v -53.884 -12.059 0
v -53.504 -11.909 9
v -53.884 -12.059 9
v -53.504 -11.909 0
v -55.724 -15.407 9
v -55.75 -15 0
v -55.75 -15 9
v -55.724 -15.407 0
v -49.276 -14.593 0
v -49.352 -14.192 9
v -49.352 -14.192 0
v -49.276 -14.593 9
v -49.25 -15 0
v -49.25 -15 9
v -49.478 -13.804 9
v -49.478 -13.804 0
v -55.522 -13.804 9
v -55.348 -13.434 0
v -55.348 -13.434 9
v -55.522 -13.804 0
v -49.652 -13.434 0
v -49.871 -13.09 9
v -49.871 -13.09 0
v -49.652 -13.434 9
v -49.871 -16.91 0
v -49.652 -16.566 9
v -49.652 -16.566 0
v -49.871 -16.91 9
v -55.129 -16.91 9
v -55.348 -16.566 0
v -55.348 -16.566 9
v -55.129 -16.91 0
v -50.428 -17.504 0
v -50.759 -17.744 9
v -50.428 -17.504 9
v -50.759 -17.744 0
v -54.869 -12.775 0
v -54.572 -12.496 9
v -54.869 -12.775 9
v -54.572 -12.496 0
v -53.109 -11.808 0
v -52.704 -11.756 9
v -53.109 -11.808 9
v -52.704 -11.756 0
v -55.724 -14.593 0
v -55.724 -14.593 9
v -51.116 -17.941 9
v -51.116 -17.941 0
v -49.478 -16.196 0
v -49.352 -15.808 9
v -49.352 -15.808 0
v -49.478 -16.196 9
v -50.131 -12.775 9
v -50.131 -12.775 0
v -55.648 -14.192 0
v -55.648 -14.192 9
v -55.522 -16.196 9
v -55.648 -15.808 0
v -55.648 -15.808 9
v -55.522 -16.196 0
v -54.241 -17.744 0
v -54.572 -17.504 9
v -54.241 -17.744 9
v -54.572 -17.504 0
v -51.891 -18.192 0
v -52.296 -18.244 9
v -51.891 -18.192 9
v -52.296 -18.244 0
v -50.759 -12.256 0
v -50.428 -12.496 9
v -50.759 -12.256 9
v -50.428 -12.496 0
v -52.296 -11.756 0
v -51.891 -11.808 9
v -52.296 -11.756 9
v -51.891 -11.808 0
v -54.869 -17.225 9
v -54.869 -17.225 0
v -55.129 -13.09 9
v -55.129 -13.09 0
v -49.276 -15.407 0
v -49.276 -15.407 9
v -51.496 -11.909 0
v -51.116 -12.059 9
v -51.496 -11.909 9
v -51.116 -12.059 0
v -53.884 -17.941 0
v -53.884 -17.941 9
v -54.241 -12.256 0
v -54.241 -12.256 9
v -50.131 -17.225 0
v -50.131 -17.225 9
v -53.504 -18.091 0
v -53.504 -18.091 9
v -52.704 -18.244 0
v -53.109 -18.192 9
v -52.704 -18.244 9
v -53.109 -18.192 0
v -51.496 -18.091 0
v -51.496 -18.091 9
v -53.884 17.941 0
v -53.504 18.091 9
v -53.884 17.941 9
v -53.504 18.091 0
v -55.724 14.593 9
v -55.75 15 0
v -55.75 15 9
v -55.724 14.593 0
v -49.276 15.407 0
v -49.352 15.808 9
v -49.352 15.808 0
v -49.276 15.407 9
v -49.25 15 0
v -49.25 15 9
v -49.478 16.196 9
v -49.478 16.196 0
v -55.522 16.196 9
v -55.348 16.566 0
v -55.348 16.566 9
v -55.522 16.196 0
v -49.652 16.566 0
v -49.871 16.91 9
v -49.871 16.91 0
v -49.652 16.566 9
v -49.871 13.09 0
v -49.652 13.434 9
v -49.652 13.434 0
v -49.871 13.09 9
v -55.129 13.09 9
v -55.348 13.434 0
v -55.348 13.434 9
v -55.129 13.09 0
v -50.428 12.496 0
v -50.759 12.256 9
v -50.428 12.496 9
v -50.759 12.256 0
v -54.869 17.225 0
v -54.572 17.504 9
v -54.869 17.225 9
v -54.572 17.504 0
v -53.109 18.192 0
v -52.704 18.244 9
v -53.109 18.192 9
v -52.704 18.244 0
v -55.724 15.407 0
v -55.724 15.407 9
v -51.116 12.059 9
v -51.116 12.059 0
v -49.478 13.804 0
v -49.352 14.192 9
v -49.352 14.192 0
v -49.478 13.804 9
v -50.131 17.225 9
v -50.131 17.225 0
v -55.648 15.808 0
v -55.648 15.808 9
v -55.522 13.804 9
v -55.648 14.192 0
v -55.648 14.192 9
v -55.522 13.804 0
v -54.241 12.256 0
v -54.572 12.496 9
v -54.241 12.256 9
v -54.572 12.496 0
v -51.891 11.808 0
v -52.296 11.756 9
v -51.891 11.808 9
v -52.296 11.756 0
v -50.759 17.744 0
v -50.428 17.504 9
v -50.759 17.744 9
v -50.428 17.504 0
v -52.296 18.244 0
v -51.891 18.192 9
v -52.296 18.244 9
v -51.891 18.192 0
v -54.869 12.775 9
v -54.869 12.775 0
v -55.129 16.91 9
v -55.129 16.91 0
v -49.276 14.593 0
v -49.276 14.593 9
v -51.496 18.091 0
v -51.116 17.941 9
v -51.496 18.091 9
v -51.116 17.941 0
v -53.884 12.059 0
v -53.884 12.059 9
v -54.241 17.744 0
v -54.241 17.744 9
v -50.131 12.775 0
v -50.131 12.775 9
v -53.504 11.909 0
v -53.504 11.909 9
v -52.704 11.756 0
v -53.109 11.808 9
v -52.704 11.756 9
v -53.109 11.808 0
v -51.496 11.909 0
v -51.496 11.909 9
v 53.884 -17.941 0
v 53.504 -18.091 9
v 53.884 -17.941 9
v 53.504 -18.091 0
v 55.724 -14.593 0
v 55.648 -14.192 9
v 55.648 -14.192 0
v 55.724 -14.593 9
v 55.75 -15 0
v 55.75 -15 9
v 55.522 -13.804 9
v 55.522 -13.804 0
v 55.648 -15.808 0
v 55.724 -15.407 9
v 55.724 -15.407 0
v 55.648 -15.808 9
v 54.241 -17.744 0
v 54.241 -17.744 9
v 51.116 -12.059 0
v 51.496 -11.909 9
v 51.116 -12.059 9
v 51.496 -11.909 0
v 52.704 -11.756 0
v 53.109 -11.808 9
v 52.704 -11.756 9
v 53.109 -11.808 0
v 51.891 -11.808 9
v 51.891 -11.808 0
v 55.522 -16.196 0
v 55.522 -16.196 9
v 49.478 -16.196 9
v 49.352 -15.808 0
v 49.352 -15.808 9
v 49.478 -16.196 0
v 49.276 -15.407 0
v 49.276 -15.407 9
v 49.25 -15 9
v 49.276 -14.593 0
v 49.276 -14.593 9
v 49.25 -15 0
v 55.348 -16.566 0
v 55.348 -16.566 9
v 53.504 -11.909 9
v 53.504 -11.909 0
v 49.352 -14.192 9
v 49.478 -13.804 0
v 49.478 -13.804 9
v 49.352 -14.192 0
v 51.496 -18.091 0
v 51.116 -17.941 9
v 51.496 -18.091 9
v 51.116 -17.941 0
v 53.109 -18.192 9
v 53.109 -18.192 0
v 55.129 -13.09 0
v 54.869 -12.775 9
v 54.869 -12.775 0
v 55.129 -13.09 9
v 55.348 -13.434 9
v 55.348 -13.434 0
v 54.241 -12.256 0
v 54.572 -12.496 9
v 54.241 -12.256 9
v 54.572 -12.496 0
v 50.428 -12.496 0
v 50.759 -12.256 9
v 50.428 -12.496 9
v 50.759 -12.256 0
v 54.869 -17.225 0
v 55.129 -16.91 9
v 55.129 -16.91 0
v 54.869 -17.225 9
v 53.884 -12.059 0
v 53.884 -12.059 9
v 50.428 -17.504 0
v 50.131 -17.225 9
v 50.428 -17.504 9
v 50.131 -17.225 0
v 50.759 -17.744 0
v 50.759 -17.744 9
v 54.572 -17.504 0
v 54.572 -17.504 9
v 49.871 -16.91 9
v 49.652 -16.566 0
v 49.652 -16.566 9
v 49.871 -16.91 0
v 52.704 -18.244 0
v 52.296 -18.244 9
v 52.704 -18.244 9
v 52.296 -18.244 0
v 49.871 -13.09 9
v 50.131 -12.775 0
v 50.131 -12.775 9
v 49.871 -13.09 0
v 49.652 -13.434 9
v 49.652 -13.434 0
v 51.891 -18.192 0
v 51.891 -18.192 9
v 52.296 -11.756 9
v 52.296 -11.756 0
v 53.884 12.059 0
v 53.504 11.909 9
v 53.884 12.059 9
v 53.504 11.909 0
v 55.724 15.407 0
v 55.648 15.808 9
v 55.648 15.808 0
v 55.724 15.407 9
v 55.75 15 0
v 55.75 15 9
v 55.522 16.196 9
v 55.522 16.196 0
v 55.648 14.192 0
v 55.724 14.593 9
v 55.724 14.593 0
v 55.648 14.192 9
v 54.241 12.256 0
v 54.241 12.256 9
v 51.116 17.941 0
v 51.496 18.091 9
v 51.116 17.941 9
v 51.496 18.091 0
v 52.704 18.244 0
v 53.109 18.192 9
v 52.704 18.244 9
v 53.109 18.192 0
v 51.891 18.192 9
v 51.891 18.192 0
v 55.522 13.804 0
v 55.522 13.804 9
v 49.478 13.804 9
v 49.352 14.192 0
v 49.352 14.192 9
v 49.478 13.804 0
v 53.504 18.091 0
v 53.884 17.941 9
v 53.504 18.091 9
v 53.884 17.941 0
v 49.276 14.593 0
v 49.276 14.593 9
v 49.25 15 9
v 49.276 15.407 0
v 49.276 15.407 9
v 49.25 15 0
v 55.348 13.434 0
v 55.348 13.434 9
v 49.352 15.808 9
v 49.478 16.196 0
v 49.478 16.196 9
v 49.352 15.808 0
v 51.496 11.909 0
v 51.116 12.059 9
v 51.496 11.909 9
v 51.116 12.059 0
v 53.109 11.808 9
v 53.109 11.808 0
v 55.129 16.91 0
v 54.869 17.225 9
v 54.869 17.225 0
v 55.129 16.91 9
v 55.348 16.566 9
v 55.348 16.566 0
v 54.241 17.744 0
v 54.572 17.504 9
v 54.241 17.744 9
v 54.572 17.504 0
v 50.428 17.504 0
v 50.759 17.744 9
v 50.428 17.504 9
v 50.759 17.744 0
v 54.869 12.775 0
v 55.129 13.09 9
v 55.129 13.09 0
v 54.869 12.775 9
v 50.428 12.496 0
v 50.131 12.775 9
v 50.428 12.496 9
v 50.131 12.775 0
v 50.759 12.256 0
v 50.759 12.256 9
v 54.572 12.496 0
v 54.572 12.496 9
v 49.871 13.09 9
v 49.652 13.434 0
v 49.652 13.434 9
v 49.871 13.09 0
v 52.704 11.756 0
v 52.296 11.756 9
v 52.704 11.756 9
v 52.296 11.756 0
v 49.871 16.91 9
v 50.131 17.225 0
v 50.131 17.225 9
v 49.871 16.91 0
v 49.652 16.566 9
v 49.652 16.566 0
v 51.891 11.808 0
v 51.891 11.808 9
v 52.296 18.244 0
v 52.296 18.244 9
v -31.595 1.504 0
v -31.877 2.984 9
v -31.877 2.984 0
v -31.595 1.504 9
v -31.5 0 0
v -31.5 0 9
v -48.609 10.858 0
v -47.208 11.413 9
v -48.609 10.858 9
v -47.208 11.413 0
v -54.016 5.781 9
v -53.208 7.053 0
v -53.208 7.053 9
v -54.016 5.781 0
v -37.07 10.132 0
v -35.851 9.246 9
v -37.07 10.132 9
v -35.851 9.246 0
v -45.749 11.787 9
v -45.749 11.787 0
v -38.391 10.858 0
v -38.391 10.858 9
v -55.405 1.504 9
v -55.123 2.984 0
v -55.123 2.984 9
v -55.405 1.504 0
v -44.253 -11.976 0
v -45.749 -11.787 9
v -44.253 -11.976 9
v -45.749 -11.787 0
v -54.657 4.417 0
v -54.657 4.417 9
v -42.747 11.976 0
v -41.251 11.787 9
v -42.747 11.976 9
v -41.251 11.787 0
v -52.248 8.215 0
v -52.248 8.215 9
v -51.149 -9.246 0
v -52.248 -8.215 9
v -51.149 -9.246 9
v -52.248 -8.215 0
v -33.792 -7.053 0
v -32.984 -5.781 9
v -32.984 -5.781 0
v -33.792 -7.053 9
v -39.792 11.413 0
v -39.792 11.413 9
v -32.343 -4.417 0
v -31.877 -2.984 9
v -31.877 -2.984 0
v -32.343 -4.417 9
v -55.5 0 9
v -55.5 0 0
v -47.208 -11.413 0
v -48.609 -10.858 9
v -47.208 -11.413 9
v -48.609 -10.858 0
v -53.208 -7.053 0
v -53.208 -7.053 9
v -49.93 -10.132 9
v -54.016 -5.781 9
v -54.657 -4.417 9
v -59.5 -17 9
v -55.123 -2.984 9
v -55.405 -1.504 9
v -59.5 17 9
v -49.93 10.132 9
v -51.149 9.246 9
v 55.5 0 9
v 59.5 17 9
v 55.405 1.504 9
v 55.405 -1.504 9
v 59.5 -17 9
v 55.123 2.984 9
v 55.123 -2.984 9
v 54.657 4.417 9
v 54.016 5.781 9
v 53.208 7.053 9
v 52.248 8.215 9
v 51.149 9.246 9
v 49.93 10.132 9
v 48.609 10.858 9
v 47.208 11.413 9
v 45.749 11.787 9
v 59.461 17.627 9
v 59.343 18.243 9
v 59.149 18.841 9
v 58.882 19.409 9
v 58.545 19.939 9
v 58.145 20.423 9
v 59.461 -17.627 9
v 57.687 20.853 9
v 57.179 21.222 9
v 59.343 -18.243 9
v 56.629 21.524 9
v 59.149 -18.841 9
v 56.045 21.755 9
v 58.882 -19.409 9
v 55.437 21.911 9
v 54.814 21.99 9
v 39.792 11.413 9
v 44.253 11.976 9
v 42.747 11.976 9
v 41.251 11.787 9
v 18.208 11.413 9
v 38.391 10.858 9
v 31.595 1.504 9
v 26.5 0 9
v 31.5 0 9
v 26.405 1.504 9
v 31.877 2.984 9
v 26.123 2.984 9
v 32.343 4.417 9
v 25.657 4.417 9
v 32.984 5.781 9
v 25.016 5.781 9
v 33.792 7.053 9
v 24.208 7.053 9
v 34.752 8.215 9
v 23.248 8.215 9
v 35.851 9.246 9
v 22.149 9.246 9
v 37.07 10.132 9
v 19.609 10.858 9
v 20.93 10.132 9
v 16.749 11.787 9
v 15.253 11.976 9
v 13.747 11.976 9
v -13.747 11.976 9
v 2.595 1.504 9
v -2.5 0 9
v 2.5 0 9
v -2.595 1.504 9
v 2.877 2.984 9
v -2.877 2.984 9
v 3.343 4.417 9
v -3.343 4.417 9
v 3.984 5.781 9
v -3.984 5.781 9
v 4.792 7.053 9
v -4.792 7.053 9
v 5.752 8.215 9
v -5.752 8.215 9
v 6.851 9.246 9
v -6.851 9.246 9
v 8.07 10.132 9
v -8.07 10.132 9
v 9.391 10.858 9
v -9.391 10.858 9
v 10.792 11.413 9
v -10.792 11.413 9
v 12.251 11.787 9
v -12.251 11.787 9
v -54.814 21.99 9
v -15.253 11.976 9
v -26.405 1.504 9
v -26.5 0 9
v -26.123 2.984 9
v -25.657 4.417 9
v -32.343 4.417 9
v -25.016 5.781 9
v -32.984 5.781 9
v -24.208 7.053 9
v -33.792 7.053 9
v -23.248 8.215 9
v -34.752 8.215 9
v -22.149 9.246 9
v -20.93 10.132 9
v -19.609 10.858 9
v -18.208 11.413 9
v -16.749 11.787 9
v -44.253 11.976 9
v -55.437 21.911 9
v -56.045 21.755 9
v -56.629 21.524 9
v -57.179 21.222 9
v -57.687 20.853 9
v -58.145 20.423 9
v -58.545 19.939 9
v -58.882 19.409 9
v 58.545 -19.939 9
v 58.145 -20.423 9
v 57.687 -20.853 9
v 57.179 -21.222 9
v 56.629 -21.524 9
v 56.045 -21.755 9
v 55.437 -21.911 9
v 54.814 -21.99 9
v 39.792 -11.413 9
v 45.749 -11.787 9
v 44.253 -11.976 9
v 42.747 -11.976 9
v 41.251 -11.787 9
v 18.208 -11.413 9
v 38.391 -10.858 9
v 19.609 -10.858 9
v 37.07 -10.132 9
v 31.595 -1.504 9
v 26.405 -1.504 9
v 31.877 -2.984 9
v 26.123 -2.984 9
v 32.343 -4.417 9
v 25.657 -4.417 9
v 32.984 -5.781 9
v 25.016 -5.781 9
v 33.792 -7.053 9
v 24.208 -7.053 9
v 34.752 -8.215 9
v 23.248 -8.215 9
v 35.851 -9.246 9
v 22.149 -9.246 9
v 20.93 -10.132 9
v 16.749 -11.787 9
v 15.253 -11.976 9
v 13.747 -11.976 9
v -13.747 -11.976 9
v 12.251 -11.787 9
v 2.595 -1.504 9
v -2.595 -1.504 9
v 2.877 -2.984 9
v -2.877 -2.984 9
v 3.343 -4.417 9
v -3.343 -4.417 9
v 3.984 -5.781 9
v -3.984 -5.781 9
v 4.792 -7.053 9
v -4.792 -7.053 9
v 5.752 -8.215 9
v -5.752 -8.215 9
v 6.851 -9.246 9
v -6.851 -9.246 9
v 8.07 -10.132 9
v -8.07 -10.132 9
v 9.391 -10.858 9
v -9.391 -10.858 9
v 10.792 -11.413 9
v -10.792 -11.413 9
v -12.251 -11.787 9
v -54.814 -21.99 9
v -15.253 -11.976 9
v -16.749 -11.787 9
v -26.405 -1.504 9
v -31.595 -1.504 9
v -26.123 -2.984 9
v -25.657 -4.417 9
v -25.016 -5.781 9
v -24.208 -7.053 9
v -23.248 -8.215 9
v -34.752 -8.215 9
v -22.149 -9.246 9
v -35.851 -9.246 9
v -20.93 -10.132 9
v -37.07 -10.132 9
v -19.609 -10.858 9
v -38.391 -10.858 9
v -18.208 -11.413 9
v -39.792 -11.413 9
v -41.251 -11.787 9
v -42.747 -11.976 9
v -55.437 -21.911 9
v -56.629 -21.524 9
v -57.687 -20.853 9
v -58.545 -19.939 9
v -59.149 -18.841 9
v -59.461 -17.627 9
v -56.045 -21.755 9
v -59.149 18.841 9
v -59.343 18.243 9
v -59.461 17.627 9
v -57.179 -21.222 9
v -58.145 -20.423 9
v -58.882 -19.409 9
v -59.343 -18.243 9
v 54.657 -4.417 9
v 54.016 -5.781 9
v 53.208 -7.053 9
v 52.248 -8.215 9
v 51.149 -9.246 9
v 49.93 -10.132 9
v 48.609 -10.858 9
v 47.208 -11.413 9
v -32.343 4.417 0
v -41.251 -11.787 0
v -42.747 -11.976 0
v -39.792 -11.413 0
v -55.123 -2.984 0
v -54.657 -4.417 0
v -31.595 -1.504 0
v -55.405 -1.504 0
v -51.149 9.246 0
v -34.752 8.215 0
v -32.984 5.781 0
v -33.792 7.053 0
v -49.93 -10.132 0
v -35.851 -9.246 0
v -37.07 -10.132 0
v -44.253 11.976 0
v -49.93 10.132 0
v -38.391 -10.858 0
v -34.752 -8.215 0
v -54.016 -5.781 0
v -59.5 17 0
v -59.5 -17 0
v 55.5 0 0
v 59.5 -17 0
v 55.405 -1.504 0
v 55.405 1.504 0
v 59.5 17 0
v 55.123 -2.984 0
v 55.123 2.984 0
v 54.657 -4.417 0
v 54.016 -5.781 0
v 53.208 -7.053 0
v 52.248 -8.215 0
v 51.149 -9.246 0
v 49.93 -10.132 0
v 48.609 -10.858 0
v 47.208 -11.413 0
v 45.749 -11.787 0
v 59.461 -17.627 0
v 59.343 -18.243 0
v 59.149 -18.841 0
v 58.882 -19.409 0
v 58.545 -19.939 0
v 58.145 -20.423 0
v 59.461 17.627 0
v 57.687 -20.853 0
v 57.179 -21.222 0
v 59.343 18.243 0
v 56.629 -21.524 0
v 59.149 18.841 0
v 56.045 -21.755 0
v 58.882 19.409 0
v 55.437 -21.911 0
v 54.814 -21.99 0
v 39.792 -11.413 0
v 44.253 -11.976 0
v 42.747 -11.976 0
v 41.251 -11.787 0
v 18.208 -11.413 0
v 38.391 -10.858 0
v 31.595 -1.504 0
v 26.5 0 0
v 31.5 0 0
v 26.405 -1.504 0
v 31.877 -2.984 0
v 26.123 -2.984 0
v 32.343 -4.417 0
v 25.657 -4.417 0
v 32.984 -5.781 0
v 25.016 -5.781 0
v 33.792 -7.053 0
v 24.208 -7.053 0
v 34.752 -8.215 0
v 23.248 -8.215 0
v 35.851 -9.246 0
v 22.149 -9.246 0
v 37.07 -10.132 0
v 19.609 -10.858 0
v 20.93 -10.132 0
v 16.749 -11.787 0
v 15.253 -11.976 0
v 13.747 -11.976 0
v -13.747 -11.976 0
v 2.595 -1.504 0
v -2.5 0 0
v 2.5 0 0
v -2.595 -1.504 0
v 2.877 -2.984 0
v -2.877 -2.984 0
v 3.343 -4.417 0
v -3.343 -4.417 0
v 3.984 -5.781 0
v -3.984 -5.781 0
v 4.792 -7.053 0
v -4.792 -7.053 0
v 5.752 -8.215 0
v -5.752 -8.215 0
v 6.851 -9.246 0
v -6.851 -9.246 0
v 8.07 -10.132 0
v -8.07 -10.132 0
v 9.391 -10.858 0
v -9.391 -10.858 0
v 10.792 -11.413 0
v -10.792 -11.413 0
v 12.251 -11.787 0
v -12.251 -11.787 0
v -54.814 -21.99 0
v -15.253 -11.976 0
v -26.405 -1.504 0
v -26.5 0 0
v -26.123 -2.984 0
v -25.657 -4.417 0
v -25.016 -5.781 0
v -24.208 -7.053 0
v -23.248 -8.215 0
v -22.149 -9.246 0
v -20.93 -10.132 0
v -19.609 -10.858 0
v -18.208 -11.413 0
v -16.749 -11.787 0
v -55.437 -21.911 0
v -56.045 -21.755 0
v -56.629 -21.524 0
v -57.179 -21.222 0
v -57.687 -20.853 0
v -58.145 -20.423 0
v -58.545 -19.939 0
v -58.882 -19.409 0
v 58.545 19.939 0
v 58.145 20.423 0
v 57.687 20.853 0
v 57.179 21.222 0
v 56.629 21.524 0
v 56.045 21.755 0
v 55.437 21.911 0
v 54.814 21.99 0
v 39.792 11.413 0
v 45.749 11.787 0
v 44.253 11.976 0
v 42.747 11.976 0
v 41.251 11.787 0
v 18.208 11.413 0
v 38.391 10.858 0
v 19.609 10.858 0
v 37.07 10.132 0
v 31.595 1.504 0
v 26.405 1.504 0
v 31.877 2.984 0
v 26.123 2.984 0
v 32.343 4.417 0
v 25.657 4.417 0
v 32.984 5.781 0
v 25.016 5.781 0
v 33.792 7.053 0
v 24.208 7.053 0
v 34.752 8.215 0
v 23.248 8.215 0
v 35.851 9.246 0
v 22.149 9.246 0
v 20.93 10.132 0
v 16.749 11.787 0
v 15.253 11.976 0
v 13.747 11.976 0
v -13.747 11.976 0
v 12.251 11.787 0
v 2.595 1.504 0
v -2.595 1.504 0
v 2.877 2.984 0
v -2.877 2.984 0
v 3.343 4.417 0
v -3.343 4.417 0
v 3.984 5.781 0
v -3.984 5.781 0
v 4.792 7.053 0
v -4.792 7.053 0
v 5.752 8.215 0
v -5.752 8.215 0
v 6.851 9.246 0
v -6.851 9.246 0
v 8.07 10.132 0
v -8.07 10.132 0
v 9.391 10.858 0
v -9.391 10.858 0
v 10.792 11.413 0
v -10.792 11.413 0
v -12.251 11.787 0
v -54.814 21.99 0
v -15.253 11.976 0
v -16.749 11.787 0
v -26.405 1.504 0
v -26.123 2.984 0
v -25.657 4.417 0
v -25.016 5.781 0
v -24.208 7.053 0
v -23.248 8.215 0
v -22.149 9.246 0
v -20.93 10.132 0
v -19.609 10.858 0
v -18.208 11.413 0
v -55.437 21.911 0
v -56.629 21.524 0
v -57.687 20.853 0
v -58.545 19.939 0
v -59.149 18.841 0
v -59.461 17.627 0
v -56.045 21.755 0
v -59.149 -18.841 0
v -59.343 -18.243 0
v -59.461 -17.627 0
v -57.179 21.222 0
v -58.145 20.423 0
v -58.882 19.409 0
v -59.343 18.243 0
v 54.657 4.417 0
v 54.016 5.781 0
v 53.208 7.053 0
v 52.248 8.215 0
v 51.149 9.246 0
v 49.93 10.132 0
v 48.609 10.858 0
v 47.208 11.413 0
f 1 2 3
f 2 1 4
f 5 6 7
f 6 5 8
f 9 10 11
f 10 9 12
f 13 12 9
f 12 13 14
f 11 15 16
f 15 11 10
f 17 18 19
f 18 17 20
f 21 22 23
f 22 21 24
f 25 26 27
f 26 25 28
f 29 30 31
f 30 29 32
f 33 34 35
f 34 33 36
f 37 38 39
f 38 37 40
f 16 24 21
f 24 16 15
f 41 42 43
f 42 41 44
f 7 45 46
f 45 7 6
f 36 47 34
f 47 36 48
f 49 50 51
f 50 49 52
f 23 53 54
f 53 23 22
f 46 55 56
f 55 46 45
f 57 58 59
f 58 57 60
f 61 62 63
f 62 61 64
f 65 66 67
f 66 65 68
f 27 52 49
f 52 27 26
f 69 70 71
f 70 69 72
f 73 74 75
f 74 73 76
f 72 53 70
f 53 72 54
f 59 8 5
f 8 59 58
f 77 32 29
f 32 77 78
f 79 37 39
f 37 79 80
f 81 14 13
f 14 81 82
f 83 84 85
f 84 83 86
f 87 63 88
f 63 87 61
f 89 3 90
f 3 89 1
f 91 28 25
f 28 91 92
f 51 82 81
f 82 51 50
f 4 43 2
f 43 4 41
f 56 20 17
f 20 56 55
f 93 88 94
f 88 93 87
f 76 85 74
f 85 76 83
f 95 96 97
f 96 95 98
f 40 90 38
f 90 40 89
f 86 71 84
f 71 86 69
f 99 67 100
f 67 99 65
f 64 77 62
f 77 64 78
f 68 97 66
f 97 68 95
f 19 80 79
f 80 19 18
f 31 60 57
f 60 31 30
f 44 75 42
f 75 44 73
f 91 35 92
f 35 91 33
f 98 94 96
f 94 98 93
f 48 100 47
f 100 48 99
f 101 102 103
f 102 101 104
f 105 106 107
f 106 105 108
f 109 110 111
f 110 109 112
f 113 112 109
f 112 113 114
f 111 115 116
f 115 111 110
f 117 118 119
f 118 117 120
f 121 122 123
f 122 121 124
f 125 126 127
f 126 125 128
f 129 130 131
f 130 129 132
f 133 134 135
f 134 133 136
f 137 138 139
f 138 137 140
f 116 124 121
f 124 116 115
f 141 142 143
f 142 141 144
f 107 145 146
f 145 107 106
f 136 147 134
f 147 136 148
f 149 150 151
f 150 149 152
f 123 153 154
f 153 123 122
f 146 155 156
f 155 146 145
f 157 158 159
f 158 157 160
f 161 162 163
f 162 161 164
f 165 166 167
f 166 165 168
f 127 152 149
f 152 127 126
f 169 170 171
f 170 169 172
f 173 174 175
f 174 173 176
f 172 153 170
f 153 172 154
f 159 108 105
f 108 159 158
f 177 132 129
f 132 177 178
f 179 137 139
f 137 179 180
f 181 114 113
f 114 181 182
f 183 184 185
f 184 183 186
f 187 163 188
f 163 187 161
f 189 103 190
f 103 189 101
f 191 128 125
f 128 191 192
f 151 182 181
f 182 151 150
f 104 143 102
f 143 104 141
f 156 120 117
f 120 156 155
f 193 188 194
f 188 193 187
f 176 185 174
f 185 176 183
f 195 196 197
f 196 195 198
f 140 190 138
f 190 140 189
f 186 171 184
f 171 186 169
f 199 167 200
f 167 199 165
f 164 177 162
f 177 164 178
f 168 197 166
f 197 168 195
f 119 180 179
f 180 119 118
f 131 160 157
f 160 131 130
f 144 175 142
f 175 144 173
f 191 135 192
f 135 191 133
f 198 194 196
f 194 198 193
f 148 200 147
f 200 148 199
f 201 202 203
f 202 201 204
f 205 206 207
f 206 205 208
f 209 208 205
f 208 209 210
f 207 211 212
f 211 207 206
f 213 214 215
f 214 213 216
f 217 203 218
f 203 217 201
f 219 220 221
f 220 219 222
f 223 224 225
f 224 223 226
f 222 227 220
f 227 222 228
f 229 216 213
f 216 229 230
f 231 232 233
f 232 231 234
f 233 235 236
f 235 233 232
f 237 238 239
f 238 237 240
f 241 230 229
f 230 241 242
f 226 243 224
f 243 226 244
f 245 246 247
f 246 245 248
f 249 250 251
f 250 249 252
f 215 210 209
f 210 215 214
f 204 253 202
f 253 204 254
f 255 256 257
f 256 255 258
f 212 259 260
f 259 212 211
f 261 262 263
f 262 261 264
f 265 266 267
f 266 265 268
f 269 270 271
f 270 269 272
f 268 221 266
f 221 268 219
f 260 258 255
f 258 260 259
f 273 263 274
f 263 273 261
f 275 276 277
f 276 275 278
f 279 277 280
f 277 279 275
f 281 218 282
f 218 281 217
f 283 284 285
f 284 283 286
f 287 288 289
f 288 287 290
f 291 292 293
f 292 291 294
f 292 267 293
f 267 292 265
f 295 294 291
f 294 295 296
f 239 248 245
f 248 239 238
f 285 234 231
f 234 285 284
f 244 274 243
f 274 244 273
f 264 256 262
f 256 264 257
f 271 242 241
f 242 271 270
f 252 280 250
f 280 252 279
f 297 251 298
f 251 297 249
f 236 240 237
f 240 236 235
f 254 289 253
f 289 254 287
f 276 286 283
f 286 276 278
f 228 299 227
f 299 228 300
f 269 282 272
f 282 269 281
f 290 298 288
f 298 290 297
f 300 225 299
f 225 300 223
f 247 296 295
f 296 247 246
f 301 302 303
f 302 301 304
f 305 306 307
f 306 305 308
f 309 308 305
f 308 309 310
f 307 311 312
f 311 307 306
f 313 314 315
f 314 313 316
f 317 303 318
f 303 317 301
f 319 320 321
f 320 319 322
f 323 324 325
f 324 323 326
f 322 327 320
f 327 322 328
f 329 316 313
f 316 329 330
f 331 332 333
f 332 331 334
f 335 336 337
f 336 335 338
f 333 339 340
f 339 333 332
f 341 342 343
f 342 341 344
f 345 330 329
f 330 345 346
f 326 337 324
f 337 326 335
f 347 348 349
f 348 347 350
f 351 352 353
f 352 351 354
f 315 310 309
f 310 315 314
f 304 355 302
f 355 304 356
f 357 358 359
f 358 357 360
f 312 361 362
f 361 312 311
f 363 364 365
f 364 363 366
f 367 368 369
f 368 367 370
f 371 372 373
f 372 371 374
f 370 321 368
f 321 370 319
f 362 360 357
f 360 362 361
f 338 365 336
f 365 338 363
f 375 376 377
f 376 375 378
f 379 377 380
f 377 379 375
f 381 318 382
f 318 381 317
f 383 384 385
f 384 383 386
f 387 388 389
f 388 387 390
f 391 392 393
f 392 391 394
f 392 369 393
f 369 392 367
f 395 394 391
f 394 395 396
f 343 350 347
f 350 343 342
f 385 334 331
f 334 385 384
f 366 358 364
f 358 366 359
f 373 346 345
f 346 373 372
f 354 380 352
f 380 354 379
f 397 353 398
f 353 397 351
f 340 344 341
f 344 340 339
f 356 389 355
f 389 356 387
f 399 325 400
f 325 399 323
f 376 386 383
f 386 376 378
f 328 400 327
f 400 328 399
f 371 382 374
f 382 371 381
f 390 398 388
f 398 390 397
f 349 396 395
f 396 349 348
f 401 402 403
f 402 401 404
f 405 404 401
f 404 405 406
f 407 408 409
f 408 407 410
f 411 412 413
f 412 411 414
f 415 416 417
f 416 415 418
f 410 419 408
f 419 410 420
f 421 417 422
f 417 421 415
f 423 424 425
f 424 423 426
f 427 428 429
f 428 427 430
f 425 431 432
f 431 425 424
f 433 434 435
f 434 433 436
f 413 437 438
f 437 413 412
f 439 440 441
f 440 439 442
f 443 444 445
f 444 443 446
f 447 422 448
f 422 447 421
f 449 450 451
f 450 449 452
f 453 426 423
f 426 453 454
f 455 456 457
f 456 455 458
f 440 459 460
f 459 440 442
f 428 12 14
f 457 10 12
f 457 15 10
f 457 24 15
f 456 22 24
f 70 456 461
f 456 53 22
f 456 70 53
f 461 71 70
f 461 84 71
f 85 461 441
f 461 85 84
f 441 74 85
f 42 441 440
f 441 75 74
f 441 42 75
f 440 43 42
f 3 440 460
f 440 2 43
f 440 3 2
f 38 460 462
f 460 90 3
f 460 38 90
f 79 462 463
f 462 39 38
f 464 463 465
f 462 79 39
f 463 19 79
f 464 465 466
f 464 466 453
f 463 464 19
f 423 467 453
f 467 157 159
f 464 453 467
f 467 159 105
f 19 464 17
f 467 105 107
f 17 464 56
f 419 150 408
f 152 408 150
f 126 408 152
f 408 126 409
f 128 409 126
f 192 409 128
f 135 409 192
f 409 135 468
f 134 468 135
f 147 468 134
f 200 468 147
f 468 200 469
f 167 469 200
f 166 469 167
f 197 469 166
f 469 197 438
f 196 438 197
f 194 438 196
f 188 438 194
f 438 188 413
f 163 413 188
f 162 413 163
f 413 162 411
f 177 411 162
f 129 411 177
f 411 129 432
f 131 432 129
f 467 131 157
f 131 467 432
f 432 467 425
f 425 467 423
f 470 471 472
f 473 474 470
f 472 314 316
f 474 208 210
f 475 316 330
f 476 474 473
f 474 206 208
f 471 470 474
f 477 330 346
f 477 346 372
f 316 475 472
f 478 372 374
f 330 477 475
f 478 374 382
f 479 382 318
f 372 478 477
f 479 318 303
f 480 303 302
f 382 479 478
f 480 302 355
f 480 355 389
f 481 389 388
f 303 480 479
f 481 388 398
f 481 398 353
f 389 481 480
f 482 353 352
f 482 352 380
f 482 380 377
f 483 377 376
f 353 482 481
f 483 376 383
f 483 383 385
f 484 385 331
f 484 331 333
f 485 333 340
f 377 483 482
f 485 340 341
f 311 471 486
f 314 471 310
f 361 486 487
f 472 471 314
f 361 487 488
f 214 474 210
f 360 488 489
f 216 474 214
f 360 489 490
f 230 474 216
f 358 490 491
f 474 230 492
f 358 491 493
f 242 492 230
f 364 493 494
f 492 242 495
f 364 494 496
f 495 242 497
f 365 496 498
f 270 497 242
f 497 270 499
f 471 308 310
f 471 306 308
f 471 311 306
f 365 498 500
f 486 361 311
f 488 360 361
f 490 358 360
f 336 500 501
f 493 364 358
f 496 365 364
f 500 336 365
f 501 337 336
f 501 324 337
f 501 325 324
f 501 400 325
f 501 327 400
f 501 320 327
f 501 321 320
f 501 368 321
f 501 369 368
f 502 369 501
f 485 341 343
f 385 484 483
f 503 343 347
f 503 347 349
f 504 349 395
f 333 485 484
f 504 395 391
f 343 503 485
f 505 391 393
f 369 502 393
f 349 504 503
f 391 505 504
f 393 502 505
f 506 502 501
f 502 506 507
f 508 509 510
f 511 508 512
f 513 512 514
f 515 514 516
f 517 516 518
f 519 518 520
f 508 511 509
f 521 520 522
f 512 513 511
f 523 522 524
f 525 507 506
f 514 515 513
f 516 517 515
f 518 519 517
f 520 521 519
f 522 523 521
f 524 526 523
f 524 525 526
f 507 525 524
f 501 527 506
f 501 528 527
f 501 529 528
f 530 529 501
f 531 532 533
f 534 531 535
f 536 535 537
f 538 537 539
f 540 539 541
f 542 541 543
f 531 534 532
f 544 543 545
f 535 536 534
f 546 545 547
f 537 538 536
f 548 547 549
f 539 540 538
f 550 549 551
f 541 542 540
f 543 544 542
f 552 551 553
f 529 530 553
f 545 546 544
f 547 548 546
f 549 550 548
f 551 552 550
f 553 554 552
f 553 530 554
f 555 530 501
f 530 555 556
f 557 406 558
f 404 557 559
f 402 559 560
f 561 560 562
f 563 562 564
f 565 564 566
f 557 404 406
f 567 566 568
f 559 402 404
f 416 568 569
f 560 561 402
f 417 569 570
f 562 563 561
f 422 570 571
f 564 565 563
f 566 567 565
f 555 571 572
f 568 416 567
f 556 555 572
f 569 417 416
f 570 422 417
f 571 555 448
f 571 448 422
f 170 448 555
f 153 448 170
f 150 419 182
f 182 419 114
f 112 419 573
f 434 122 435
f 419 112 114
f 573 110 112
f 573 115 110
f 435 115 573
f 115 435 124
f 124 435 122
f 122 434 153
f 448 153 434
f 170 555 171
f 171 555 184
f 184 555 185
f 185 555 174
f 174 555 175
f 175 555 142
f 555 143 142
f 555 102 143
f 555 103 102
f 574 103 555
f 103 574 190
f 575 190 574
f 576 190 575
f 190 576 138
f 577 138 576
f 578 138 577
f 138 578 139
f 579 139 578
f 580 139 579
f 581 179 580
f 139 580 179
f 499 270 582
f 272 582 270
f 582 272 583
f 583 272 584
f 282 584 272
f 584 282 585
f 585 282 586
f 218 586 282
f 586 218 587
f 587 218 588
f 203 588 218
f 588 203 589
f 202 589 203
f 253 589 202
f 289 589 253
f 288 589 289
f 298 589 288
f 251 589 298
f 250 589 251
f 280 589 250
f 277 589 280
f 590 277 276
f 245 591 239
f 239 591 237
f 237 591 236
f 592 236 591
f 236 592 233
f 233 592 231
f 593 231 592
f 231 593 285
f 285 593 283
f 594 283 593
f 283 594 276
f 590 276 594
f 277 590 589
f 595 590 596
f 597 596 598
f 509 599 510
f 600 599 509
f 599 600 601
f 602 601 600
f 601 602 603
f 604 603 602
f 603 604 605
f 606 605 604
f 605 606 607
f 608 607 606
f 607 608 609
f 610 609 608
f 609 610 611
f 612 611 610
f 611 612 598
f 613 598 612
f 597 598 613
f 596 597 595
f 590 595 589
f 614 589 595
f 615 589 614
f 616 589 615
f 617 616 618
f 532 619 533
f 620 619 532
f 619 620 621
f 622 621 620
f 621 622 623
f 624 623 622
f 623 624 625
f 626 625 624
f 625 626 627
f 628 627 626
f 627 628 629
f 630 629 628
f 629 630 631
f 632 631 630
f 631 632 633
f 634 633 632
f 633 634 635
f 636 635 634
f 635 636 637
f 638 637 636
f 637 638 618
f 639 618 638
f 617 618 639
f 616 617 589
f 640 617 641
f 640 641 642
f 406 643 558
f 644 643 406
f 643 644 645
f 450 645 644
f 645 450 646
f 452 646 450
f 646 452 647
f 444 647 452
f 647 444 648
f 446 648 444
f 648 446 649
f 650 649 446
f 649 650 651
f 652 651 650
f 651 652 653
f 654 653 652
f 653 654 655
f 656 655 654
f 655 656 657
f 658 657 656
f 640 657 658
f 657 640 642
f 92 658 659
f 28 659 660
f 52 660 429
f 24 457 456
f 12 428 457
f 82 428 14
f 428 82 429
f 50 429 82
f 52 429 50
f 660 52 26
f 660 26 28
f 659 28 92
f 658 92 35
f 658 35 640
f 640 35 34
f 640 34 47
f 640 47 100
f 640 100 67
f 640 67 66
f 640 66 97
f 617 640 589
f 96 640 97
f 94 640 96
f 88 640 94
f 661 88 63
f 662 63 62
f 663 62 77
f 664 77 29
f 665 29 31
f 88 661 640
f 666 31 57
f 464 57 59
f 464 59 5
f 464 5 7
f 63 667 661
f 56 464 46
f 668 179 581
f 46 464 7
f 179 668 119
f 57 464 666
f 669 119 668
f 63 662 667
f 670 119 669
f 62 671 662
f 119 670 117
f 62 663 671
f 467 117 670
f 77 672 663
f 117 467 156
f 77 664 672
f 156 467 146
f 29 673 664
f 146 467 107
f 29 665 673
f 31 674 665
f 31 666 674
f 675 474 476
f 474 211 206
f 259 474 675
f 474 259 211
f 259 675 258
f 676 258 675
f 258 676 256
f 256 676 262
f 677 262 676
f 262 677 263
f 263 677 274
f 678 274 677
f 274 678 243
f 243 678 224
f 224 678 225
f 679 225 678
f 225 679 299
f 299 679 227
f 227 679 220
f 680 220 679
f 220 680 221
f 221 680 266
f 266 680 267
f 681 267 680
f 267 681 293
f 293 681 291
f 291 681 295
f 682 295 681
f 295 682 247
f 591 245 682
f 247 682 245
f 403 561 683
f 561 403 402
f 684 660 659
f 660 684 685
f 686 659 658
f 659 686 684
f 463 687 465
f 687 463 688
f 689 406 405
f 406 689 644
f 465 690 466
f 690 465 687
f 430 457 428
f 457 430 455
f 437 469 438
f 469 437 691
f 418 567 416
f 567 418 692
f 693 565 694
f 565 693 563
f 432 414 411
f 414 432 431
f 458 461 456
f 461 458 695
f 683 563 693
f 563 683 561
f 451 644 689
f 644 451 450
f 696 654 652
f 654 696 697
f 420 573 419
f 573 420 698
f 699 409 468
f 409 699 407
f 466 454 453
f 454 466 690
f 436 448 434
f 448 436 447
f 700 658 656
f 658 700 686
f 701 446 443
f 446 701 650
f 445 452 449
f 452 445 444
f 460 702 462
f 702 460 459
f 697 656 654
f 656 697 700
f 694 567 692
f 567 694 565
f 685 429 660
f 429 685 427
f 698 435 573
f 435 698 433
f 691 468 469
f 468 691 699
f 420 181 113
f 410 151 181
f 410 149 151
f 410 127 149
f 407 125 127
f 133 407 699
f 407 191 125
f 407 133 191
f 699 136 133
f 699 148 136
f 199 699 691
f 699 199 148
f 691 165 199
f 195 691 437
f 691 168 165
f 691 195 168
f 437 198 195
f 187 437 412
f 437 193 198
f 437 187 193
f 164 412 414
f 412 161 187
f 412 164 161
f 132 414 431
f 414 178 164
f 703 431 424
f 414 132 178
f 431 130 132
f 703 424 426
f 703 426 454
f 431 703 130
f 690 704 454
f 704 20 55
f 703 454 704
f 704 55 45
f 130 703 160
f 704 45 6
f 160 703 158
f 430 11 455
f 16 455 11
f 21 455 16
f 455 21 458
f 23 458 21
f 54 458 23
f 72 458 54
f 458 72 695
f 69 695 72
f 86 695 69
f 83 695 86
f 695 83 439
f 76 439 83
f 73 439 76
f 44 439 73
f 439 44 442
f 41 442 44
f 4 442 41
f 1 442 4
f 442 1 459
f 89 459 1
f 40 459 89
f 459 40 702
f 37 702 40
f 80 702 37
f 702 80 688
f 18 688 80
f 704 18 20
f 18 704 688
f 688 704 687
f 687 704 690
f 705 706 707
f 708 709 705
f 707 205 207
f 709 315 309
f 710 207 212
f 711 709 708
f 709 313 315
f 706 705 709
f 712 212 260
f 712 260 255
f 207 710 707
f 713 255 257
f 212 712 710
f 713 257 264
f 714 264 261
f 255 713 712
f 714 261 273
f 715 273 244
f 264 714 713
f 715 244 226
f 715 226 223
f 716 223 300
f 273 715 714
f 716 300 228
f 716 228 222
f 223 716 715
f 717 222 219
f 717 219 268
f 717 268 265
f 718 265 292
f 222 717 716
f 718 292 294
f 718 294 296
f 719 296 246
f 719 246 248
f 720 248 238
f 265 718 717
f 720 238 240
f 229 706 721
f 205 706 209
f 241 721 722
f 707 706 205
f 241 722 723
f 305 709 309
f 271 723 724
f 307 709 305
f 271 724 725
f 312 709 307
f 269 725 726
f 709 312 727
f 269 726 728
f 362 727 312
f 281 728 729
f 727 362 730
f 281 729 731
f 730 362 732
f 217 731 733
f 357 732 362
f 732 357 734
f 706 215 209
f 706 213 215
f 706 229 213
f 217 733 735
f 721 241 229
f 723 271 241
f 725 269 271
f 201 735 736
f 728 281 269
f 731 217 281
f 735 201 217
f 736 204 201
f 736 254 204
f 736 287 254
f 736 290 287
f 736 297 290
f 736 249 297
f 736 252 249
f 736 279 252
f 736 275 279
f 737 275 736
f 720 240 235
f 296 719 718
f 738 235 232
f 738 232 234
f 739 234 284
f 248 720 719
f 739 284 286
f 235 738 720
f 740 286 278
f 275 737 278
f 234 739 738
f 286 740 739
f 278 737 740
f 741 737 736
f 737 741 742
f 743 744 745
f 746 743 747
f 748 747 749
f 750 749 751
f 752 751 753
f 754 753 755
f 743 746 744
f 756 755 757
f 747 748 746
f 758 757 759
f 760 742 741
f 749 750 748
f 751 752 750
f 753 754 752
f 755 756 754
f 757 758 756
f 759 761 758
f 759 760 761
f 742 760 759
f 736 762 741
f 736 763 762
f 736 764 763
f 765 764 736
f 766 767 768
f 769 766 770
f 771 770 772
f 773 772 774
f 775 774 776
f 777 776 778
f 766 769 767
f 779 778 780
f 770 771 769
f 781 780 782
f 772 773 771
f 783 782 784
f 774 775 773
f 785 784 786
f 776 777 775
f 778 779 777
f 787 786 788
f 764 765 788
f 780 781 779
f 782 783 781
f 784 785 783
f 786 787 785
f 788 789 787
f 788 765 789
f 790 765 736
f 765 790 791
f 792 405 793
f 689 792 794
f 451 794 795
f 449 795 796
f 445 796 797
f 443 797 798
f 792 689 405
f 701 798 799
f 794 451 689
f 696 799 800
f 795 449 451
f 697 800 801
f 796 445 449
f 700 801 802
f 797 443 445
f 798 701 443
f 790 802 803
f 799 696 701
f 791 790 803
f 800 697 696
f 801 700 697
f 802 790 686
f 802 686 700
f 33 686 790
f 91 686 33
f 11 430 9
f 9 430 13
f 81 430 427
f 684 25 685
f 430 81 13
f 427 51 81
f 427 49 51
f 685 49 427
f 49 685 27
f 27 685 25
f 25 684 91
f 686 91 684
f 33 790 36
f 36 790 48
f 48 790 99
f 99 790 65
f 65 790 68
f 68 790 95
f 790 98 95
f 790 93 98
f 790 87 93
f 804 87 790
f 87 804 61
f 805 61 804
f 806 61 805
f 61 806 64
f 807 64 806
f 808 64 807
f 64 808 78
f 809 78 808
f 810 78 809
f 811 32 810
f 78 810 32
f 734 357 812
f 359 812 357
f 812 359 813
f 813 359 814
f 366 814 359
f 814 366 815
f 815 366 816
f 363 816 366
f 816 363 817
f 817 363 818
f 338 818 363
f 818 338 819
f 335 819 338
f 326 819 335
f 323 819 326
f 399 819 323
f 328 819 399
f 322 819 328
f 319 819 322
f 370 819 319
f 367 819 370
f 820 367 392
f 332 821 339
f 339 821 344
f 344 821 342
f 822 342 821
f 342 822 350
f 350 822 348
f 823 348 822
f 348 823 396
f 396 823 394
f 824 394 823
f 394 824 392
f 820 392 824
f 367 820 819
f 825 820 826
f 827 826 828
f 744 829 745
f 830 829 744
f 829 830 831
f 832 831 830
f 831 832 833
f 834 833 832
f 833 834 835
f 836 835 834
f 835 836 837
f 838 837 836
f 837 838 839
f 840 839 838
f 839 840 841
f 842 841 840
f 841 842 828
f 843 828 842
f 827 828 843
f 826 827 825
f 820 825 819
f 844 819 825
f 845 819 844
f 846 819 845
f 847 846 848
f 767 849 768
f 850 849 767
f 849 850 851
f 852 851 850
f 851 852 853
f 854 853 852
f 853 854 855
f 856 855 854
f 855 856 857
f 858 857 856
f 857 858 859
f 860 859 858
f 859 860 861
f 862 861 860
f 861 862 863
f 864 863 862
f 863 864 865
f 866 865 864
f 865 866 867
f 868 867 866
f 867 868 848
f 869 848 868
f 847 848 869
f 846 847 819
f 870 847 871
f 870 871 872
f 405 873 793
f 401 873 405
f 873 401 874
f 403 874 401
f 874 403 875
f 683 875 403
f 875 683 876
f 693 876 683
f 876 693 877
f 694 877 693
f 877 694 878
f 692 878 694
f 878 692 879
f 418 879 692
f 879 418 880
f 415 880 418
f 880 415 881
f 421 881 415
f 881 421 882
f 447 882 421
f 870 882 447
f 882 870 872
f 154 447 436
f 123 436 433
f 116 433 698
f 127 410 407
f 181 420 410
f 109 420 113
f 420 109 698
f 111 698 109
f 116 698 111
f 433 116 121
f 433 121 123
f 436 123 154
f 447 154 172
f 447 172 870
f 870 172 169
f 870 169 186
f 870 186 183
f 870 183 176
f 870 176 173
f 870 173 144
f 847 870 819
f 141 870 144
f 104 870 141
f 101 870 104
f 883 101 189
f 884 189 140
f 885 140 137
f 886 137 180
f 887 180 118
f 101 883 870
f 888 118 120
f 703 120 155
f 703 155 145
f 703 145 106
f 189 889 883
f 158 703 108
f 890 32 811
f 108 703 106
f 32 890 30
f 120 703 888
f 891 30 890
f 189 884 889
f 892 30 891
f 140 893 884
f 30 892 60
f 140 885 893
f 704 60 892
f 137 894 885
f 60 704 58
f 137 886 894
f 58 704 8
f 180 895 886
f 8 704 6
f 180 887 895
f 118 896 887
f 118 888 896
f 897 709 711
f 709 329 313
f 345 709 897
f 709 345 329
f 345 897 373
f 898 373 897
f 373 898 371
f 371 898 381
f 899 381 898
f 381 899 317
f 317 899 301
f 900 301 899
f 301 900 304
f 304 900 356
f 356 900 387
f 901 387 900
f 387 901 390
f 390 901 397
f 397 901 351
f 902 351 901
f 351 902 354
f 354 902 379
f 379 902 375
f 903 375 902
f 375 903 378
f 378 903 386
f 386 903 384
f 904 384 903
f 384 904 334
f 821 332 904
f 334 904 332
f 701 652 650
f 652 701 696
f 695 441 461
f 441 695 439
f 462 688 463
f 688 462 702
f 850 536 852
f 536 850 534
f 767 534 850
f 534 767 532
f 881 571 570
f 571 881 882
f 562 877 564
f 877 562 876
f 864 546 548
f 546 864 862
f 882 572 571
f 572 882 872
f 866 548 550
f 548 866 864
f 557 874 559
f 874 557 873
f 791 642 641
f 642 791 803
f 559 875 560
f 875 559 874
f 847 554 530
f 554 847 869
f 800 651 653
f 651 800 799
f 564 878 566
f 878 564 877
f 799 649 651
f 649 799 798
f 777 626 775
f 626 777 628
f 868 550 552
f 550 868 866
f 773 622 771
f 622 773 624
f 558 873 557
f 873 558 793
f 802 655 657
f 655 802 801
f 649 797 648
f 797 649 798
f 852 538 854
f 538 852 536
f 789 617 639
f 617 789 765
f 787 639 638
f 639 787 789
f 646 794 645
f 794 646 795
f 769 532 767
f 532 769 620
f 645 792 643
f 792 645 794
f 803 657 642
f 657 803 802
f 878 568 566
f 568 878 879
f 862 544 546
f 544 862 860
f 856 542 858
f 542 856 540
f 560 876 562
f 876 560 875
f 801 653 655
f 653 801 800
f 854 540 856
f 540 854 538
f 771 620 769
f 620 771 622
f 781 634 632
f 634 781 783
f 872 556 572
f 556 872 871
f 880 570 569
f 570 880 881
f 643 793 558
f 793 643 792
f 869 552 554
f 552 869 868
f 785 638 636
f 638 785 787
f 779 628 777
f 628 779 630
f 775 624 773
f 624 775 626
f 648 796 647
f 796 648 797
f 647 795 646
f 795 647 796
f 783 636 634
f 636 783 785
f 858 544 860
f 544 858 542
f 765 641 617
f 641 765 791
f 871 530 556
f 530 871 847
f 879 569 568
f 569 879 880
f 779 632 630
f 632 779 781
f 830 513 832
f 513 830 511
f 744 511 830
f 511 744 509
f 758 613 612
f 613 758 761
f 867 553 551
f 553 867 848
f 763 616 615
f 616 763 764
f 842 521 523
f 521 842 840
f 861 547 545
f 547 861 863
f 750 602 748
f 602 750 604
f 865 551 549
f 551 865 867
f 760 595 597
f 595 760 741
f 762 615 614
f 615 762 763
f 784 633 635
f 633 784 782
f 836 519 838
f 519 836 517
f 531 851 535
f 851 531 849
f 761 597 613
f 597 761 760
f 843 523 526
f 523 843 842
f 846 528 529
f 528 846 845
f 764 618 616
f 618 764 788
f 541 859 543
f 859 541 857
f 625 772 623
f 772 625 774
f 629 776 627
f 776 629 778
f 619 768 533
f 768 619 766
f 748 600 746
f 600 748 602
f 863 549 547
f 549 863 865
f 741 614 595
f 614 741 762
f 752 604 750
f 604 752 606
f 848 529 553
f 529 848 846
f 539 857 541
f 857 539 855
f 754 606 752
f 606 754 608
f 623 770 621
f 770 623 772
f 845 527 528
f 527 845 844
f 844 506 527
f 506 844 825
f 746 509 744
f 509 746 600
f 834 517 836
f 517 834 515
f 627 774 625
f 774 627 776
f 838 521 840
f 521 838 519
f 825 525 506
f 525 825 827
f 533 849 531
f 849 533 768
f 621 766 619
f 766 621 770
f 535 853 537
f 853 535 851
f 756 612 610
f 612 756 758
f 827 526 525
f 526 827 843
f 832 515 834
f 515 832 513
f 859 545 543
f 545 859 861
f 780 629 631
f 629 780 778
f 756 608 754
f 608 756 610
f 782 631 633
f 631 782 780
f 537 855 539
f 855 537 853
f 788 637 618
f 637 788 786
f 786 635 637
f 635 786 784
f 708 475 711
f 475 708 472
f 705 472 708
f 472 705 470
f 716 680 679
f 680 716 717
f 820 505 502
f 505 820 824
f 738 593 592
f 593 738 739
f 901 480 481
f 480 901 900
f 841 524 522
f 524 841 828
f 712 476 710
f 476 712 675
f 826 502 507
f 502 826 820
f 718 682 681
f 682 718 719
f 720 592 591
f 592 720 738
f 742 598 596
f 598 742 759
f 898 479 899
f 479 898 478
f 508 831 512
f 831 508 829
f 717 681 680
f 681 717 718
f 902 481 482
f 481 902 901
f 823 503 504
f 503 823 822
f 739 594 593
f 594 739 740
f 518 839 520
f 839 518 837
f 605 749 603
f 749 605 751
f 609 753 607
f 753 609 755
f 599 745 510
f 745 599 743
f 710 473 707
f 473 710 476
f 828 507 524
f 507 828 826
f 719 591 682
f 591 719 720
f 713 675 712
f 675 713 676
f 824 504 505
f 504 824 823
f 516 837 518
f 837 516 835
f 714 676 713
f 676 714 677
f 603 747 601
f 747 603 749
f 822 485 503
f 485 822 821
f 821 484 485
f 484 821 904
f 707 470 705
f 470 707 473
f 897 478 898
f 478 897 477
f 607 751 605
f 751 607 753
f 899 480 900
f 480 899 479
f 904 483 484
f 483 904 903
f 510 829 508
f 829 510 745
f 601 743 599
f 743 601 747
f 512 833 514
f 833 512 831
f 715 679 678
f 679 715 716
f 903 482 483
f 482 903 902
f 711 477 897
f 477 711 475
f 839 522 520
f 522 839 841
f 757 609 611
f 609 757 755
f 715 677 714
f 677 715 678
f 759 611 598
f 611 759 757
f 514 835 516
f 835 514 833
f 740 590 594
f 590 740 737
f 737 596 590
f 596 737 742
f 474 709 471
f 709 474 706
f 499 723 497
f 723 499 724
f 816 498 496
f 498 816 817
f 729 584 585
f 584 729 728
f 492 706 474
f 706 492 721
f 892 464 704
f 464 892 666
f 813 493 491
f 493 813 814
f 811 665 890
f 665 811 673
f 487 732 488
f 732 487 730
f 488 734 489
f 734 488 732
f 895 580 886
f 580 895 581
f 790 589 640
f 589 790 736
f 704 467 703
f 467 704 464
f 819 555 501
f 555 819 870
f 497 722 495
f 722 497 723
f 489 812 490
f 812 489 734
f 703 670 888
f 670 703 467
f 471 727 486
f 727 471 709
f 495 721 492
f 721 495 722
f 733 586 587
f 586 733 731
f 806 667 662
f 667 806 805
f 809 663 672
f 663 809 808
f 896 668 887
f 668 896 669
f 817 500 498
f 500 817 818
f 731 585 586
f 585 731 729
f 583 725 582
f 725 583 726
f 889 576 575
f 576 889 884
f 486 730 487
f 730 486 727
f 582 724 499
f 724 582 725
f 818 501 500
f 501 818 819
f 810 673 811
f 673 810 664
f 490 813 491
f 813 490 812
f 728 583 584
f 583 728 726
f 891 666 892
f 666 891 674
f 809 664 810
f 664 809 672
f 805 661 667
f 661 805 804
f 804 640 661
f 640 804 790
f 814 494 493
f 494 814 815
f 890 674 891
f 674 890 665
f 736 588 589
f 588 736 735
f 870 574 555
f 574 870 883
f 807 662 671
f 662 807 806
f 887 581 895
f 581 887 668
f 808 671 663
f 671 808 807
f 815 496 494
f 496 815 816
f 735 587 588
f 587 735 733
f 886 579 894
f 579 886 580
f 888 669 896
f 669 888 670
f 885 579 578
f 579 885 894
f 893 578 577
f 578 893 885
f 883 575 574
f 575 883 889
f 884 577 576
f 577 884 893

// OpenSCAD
$fn = 50;


difference() {
	union() {
		hull() {
			translate(v = [-54.5000000000, 17.0000000000, 0]) {
				cylinder(h = 9, r = 5);
			}
			translate(v = [54.5000000000, 17.0000000000, 0]) {
				cylinder(h = 9, r = 5);
			}
			translate(v = [-54.5000000000, -17.0000000000, 0]) {
				cylinder(h = 9, r = 5);
			}
			translate(v = [54.5000000000, -17.0000000000, 0]) {
				cylinder(h = 9, r = 5);
			}
		}
	}
	union() {
		#translate(v = [-52.5000000000, -15.0000000000, -100.0000000000]) {
			cylinder(h = 200, r = 3.2500000000);
		}
		#translate(v = [-52.5000000000, 15.0000000000, -100.0000000000]) {
			cylinder(h = 200, r = 3.2500000000);
		}
		#translate(v = [52.5000000000, -15.0000000000, -100.0000000000]) {
			cylinder(h = 200, r = 3.2500000000);
		}
		#translate(v = [52.5000000000, 15.0000000000, -100.0000000000]) {
			cylinder(h = 200, r = 3.2500000000);
		}
		#translate(v = [-43.5000000000, 0, 0]) {
			cylinder(h = 9, r = 12.0000000000);
		}
		#translate(v = [-14.5000000000, 0, 0]) {
			cylinder(h = 9, r = 12.0000000000);
		}
		#translate(v = [14.5000000000, 0, 0]) {
			cylinder(h = 9, r = 12.0000000000);
		}
		#translate(v = [43.5000000000, 0, 0]) {
			cylinder(h = 9, r = 12.0000000000);
		}
	}
}
